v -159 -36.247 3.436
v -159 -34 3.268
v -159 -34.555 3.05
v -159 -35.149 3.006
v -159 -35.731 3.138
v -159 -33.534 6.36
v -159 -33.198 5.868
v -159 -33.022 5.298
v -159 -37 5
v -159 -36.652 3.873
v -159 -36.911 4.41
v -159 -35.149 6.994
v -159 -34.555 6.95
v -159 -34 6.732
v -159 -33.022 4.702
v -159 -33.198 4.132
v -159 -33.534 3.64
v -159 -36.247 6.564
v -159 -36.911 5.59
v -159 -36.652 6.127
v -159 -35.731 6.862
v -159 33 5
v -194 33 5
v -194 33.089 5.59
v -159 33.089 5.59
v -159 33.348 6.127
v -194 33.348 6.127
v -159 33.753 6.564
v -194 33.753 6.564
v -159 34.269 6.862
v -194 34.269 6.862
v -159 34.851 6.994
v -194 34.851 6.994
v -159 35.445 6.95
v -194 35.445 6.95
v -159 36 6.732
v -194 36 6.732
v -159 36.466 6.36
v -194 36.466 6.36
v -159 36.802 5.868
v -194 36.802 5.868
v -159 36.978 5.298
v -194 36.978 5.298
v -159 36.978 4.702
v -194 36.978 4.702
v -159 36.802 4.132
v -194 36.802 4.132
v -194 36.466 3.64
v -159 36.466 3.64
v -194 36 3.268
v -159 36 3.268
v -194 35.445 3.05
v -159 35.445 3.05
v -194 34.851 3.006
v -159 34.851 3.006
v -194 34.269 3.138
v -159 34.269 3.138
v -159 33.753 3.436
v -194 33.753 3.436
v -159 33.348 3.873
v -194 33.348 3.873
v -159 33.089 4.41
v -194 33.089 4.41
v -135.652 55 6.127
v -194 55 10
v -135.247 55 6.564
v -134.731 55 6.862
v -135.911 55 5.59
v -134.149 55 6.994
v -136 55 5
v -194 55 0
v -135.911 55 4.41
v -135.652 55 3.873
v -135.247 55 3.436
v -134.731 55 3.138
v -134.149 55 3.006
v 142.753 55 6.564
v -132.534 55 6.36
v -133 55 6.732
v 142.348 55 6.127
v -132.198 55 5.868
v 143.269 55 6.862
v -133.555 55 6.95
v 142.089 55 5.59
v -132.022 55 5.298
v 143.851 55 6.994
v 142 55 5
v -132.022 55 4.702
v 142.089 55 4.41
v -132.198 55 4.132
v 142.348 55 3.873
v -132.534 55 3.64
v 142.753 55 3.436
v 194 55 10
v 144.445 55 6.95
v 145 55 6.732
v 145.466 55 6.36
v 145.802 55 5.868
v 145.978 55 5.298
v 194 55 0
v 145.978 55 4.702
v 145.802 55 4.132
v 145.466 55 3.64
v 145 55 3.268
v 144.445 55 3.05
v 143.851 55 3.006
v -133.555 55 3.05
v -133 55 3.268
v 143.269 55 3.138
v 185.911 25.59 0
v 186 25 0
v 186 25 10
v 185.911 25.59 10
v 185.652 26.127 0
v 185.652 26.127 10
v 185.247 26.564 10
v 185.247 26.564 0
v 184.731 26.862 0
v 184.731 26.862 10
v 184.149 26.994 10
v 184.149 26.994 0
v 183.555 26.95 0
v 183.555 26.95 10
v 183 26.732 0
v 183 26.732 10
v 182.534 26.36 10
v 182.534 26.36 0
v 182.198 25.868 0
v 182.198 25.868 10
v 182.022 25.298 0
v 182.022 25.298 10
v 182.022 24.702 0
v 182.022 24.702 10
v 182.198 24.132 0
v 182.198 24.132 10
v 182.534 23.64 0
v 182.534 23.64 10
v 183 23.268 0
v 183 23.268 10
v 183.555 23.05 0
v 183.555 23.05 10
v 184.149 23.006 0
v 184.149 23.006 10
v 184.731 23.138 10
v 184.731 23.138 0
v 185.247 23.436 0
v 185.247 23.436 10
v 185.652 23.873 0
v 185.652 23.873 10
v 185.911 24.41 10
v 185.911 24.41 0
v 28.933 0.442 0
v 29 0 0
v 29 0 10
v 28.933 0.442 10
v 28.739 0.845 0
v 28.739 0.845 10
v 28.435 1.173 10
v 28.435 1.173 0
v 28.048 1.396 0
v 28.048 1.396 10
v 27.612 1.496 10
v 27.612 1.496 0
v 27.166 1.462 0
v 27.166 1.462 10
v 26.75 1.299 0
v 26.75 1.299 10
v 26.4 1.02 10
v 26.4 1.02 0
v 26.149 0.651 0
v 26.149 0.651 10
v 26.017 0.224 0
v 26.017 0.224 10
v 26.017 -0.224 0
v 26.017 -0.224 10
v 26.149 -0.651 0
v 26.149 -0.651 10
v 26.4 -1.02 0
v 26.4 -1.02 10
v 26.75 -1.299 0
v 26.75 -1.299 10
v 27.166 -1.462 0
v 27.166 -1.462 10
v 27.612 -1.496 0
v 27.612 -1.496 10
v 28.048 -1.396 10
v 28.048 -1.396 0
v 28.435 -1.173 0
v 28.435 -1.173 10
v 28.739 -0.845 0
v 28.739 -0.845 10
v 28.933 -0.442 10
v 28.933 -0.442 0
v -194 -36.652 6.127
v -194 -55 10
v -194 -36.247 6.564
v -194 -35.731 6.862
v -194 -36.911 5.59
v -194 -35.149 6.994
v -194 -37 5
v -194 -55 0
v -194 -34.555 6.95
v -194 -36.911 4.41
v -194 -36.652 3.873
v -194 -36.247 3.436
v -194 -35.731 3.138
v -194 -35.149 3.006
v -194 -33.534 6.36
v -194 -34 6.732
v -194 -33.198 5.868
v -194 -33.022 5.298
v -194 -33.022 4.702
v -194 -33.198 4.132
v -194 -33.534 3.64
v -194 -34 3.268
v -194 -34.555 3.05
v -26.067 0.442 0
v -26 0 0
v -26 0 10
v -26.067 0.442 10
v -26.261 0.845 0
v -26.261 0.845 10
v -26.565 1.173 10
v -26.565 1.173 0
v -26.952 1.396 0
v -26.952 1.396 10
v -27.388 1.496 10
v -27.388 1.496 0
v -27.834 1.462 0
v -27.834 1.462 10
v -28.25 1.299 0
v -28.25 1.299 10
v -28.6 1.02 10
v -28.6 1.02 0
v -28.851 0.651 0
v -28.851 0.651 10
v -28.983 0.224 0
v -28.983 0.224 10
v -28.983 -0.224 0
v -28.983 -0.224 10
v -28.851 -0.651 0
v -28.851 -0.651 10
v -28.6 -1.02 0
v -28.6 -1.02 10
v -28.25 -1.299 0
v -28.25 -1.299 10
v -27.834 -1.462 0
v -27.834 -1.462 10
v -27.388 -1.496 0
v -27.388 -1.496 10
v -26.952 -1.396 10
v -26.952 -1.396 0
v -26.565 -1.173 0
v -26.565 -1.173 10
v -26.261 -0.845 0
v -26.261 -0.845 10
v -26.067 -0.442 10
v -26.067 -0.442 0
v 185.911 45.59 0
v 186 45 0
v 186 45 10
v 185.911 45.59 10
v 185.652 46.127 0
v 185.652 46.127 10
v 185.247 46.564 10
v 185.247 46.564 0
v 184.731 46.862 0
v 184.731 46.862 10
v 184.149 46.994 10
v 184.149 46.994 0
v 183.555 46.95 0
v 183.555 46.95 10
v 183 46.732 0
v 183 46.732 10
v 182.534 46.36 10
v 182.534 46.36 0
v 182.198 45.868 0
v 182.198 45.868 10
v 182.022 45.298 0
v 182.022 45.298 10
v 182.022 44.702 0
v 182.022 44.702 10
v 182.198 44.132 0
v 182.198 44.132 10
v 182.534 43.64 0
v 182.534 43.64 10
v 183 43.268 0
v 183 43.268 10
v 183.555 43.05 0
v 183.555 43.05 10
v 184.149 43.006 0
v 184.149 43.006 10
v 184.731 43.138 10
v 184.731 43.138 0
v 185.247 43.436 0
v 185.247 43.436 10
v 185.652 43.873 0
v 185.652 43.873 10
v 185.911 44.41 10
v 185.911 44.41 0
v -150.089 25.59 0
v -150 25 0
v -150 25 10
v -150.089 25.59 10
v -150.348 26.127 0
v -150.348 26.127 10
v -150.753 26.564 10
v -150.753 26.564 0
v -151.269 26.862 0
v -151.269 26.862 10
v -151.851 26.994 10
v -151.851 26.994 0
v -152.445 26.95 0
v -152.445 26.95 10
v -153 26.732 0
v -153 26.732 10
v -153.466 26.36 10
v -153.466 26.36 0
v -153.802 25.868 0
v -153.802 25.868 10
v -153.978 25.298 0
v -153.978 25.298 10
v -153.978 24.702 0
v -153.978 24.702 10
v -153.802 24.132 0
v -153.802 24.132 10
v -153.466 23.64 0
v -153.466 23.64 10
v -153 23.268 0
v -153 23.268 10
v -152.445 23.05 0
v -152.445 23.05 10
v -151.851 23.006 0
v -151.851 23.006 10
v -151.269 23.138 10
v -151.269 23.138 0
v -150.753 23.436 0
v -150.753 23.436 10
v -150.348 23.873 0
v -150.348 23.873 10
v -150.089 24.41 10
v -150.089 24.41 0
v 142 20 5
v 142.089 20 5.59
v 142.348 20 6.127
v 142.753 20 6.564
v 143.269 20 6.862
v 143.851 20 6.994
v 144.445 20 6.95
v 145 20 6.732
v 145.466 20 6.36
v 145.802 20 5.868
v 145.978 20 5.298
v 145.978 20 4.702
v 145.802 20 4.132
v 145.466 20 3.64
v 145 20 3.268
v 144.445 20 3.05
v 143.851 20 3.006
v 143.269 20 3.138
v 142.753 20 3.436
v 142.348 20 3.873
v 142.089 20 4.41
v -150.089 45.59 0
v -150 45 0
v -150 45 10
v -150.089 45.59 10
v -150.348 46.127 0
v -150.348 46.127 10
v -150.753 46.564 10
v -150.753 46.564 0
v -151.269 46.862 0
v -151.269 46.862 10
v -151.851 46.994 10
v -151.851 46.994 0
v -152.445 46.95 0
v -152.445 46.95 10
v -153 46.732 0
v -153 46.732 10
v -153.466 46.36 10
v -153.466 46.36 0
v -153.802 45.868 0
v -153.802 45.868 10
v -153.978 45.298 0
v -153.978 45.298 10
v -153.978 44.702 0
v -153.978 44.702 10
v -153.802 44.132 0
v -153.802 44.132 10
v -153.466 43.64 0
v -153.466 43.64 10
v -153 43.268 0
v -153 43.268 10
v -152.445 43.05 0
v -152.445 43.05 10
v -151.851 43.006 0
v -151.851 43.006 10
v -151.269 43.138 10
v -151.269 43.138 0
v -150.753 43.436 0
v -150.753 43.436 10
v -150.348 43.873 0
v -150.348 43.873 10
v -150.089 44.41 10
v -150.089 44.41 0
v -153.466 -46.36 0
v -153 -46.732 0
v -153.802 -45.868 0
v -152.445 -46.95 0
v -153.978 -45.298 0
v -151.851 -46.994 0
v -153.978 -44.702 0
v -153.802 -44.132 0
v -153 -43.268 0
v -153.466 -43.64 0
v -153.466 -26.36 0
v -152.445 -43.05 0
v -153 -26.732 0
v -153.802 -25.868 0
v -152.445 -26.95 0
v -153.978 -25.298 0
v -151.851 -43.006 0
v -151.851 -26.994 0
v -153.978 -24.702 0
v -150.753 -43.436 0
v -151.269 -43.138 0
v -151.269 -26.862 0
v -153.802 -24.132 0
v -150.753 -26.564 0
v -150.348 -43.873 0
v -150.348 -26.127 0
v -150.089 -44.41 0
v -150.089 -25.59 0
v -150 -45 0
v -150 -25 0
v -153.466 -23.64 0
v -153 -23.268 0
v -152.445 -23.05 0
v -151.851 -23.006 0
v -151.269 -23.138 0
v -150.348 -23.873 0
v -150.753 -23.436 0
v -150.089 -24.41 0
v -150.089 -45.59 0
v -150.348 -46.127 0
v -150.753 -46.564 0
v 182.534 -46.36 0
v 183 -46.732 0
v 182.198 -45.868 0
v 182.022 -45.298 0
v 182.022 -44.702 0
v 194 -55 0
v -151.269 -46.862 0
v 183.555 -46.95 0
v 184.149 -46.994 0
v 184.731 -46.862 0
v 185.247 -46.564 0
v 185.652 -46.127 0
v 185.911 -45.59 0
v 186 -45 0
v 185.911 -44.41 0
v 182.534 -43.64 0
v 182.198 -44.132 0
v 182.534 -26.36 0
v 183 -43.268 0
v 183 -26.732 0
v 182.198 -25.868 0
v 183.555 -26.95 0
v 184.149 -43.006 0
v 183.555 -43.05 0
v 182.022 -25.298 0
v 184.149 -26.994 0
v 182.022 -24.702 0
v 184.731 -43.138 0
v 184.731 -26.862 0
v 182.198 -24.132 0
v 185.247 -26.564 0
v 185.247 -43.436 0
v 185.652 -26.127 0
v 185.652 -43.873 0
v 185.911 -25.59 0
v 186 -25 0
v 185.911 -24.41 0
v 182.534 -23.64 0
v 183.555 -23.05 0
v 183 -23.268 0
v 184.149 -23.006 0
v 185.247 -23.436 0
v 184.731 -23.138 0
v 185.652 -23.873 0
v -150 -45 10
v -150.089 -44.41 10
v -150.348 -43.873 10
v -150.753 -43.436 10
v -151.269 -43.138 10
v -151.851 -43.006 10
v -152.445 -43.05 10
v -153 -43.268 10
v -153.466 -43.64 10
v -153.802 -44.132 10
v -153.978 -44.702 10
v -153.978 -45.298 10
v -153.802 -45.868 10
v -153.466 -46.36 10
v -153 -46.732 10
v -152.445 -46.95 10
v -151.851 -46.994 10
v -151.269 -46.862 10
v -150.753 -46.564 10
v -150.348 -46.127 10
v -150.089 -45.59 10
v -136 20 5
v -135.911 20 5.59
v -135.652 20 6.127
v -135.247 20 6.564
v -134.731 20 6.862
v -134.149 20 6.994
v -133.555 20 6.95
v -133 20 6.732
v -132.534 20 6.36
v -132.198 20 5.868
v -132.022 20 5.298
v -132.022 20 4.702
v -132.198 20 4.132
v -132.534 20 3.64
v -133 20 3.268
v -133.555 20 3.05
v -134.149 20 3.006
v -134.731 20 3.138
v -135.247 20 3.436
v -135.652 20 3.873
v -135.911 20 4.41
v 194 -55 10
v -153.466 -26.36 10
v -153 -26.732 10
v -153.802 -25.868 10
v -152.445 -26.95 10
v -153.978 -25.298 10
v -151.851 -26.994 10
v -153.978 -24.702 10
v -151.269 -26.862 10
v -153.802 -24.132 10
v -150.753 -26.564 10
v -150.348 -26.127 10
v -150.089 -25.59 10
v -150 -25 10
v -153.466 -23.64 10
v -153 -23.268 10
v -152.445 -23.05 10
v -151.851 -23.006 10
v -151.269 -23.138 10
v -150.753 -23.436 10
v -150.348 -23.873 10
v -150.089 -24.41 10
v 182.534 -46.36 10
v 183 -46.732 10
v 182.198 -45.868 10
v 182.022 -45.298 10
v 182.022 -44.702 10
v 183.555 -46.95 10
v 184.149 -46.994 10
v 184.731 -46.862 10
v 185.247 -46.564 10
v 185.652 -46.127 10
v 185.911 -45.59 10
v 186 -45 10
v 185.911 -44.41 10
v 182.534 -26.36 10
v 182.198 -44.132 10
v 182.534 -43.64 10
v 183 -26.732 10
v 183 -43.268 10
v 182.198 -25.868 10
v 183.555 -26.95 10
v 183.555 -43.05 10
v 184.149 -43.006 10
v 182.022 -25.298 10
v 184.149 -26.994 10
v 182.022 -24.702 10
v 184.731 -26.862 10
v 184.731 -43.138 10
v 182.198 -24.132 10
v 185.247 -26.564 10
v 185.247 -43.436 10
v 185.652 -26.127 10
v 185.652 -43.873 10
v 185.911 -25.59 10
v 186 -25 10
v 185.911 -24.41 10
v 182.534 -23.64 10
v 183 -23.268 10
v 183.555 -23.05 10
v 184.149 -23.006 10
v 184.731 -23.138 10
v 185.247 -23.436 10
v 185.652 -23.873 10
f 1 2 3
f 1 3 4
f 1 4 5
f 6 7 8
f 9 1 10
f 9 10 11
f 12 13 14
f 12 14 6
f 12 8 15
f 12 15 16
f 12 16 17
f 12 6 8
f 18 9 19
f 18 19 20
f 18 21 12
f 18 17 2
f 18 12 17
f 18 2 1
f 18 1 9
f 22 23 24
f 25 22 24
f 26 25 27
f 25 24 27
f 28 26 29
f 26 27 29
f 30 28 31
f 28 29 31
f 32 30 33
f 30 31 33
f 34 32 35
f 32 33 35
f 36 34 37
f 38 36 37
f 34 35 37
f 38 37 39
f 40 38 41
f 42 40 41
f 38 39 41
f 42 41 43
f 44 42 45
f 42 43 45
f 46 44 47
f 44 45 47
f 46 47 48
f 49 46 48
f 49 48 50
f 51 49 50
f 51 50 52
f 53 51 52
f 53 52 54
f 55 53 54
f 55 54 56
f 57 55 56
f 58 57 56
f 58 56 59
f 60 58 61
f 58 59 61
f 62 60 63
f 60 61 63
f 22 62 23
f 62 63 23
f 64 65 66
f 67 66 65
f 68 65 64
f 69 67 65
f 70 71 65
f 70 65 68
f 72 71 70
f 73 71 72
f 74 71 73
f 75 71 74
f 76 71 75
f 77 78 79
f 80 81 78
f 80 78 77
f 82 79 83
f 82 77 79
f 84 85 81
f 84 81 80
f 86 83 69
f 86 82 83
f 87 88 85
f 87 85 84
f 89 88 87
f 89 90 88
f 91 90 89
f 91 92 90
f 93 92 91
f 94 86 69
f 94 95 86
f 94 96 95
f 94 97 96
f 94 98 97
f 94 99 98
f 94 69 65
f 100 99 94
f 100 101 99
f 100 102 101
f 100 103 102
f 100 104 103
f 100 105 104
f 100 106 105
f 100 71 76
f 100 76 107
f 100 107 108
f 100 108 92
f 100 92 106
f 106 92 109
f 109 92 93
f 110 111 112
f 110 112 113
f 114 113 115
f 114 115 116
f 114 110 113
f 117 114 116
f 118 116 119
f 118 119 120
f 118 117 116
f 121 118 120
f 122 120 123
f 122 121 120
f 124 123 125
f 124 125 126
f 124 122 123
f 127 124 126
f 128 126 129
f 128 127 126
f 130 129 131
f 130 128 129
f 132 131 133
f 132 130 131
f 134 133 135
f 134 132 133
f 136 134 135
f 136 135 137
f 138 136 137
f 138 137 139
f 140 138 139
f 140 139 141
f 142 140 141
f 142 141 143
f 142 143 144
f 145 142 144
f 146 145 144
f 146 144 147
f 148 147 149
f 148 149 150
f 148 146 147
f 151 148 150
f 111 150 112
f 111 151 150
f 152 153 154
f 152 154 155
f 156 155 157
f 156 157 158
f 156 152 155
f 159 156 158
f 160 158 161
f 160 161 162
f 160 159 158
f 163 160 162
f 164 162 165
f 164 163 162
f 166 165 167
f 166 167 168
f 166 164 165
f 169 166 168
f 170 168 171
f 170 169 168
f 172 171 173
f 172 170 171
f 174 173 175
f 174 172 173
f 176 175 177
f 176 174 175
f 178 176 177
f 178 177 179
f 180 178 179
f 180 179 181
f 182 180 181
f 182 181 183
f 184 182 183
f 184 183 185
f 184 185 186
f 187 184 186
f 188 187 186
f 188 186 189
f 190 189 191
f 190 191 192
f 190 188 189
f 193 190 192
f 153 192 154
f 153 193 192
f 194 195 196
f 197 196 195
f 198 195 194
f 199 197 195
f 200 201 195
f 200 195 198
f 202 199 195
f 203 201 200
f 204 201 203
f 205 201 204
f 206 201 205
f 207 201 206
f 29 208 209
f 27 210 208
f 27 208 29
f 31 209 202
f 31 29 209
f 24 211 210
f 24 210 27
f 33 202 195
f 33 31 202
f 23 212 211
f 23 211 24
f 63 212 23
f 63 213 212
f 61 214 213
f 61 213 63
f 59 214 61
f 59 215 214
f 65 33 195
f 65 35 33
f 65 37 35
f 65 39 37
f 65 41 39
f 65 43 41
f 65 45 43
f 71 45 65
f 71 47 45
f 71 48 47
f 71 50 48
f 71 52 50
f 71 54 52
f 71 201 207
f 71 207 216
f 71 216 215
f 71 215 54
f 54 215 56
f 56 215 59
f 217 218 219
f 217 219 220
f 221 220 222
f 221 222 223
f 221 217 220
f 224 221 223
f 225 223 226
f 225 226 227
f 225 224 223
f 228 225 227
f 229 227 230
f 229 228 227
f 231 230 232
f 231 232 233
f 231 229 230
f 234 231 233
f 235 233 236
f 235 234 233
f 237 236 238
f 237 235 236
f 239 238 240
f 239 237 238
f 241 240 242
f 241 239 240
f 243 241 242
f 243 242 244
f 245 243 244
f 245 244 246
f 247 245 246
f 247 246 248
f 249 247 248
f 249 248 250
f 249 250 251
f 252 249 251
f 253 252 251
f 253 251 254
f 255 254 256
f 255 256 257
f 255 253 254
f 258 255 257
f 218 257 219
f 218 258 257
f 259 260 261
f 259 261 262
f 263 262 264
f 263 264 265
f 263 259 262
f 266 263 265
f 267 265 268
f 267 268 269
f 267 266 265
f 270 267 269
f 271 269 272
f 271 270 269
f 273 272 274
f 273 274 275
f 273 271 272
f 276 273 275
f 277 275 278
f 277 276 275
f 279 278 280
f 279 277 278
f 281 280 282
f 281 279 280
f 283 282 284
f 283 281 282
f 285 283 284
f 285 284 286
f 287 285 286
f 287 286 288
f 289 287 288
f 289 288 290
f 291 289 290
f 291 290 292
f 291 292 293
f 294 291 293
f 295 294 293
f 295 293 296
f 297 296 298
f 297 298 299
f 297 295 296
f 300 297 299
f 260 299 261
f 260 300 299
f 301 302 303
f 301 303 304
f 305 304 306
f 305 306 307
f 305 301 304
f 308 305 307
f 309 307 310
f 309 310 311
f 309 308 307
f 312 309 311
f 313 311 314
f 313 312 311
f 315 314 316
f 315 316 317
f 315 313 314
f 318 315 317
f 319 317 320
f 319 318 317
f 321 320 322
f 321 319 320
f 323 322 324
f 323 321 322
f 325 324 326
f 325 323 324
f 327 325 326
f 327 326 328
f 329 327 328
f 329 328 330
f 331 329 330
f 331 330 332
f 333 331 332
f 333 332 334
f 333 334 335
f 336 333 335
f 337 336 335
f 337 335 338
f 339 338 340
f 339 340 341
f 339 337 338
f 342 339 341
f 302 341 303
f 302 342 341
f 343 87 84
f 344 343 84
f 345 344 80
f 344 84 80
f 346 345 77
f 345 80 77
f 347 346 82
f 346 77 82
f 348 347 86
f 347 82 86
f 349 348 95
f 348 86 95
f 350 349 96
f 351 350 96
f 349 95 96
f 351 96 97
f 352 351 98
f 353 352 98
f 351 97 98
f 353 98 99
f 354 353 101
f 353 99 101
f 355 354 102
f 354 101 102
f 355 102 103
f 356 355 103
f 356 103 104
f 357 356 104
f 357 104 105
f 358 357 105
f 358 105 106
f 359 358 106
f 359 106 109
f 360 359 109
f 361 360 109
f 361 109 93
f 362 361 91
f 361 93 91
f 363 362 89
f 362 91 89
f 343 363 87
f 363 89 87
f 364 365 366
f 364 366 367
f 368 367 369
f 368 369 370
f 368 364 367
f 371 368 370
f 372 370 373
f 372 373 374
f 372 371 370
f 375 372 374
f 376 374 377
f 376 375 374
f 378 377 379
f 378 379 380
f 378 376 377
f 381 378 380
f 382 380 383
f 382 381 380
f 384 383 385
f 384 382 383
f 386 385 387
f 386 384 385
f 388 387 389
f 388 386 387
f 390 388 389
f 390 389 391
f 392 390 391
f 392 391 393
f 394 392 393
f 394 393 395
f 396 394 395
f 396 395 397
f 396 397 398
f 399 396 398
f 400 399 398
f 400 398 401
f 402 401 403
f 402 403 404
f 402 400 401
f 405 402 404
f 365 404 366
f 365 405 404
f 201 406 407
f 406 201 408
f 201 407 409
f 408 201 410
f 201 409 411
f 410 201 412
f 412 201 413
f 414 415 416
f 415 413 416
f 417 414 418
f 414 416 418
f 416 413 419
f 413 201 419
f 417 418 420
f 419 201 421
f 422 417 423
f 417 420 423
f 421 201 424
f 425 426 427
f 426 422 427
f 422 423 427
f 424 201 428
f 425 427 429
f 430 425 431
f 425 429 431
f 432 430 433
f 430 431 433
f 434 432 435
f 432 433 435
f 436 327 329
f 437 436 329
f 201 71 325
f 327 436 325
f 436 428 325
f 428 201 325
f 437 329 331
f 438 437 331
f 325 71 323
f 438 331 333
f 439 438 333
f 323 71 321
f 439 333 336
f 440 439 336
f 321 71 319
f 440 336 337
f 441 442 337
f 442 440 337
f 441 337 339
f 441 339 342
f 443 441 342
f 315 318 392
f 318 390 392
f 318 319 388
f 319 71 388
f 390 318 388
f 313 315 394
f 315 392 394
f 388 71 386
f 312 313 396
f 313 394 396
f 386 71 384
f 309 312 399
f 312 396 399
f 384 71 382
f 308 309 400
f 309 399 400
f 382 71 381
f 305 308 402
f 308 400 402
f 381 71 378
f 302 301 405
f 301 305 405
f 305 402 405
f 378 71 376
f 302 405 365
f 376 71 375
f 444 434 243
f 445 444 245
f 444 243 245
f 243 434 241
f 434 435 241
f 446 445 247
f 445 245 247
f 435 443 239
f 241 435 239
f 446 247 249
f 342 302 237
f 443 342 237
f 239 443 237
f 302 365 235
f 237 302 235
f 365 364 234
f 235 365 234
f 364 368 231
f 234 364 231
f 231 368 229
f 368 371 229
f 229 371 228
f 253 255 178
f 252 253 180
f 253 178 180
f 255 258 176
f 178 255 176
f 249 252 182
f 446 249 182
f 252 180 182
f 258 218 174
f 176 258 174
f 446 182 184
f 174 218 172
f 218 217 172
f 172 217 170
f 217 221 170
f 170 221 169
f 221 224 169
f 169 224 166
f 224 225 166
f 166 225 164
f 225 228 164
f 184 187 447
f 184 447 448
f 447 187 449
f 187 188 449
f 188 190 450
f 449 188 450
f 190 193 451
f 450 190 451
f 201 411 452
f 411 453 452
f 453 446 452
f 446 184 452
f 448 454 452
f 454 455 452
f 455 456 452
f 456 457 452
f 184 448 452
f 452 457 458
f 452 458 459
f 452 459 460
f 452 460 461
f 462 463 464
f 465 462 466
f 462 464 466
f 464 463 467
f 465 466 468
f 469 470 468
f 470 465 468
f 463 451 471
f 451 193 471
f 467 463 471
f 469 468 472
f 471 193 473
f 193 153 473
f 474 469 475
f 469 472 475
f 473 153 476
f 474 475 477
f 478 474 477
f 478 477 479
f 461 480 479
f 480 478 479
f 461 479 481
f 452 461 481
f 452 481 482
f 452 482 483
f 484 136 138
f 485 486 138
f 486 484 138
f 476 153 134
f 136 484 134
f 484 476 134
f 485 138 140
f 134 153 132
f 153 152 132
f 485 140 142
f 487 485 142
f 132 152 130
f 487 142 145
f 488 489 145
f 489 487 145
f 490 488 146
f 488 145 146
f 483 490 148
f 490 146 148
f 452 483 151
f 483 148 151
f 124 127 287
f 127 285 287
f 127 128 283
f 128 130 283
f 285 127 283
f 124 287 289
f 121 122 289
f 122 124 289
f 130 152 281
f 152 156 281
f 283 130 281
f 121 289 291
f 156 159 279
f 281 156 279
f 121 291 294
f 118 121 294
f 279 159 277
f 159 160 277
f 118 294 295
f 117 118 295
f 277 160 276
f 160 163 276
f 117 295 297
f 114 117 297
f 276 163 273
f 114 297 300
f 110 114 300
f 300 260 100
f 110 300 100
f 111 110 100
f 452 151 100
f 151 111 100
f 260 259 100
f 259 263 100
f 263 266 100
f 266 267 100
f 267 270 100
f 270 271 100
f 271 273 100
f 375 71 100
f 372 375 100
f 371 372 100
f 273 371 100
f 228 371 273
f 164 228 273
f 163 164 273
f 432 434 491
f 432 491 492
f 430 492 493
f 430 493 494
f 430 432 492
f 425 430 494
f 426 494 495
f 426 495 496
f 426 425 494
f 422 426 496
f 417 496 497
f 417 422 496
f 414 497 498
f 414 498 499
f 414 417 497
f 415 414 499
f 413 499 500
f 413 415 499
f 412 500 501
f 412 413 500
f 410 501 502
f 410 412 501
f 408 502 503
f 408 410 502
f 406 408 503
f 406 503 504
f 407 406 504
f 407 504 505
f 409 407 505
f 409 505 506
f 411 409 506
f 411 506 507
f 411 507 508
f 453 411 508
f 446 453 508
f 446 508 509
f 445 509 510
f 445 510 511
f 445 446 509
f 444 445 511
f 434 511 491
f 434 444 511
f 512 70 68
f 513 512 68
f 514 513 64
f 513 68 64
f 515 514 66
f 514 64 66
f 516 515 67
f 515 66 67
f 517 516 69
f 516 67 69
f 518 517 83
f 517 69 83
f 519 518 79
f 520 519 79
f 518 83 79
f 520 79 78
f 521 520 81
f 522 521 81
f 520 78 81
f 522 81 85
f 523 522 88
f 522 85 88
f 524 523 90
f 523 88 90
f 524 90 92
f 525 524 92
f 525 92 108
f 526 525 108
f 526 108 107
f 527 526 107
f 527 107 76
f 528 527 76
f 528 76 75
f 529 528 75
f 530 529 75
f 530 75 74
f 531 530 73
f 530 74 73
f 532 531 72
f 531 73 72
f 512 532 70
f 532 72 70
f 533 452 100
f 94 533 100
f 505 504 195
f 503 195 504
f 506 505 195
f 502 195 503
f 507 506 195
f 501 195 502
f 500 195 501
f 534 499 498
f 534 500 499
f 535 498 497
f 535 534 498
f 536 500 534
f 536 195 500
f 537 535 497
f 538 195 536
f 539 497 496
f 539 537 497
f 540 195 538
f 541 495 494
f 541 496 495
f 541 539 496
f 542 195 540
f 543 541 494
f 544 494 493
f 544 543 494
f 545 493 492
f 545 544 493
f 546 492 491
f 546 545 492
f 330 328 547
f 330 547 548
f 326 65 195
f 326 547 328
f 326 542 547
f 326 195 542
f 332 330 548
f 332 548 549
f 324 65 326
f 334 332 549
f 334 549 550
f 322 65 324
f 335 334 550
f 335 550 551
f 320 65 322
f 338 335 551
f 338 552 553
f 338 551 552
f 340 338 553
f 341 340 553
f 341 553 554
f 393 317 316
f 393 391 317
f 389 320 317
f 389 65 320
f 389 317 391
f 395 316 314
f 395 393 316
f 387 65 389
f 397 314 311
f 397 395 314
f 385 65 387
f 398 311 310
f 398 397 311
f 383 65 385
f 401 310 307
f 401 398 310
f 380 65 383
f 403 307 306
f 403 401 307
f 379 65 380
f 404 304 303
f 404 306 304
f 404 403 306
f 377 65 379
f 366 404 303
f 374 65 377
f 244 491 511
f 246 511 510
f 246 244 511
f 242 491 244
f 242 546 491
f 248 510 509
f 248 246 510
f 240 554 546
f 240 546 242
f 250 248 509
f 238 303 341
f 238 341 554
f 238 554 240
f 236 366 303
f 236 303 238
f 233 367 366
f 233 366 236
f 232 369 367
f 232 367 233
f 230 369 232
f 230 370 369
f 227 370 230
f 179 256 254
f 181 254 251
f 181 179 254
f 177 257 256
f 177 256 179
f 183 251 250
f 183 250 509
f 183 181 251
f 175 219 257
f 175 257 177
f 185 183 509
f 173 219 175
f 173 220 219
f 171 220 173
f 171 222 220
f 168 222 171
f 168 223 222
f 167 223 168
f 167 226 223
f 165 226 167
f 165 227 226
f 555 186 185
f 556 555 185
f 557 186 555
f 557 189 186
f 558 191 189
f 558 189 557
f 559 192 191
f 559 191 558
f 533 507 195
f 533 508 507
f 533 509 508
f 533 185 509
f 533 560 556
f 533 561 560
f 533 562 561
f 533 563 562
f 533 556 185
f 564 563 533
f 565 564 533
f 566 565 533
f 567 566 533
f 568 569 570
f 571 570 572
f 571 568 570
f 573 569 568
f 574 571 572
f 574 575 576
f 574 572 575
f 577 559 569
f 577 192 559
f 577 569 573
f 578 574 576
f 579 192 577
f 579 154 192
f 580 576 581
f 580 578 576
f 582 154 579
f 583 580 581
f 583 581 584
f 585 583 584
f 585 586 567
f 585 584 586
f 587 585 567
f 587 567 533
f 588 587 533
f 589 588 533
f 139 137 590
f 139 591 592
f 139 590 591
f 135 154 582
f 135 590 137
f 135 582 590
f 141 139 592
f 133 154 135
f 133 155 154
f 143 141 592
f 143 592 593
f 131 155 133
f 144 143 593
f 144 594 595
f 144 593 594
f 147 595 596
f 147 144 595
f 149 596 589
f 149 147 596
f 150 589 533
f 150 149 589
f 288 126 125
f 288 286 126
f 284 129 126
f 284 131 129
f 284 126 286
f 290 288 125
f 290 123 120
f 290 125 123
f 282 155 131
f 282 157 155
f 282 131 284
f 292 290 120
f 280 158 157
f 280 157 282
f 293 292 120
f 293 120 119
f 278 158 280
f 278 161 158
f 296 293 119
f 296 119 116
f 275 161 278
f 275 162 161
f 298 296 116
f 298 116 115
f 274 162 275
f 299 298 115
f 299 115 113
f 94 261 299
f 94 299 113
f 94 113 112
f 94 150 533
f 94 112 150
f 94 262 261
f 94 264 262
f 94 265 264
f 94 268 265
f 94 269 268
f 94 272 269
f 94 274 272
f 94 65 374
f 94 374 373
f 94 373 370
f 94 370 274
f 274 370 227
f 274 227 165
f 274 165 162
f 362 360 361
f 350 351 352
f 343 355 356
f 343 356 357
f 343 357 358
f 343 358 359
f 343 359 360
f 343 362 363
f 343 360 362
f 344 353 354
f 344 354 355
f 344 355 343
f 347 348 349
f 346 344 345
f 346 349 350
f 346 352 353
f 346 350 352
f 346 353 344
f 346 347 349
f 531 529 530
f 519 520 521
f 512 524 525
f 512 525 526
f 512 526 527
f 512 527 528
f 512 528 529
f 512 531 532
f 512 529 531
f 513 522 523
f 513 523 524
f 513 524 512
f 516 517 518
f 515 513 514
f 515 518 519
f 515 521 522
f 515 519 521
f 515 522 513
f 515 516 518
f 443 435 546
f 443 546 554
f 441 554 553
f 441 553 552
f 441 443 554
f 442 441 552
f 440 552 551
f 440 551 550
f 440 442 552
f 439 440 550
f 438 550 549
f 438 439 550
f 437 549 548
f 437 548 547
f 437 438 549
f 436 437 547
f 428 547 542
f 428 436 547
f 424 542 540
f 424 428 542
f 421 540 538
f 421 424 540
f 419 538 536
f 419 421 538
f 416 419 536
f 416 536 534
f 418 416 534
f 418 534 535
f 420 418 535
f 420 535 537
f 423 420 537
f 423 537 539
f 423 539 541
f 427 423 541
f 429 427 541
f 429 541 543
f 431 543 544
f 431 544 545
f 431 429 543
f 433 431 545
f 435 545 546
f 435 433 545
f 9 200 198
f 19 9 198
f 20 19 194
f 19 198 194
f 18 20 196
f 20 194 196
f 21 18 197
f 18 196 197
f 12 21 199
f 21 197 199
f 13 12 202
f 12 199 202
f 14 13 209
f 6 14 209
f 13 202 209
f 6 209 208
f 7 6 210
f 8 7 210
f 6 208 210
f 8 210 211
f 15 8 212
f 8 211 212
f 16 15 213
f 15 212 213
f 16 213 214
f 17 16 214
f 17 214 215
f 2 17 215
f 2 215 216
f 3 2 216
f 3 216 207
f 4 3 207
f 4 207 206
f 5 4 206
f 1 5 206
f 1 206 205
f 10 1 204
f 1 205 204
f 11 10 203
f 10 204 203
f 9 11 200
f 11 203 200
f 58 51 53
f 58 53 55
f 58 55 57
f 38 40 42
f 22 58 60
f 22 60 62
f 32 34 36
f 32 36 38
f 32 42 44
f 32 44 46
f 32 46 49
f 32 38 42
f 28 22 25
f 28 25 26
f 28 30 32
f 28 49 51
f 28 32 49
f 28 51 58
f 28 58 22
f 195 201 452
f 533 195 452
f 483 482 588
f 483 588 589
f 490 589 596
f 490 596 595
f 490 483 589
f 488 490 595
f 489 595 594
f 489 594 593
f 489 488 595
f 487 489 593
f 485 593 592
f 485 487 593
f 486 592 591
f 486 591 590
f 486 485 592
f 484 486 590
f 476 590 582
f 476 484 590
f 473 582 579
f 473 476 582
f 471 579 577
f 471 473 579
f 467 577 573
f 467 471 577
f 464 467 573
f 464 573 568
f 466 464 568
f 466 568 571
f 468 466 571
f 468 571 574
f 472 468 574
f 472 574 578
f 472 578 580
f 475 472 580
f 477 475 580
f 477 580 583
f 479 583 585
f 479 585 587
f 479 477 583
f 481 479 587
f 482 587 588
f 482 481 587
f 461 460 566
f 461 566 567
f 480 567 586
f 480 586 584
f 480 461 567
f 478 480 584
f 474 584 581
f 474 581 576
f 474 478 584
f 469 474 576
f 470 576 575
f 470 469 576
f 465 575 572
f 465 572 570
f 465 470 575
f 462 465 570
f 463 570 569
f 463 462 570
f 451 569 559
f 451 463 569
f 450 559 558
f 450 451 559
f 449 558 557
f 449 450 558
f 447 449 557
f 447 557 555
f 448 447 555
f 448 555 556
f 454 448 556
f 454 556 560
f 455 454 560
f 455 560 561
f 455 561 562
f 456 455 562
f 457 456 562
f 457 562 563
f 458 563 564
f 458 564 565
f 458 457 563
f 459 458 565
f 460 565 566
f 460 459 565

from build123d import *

# Parameters (mm, degrees)
F0_W     = 388
F0_H     = 110
F0_R     = 2
F0_R_2   = 1.5
F1_DEPTH = 10
F2_R     = 2
F3_DEPTH = 35
F4_R     = 2
F5_DEPTH = 35


with BuildPart() as f1:
    # F0 (on Top) → F1 (new body)
    with BuildSketch(Plane.XY):
        Rectangle(F0_W, F0_H)
        with Locations((-152, -45)):
            Circle(F0_R, mode=Mode.SUBTRACT)
        with Locations((-152, -25)):
            Circle(F0_R, mode=Mode.SUBTRACT)
        with Locations((184, -45)):
            Circle(F0_R, mode=Mode.SUBTRACT)
        with Locations((184, -25)):
            Circle(F0_R, mode=Mode.SUBTRACT)
        with Locations((-152, 25)):
            Circle(F0_R, mode=Mode.SUBTRACT)
        with Locations((-27.5, 0)):
            Circle(F0_R_2, mode=Mode.SUBTRACT)
        with Locations((-152, 45)):
            Circle(F0_R, mode=Mode.SUBTRACT)
        with Locations((27.5, 0)):
            Circle(F0_R_2, mode=Mode.SUBTRACT)
        with Locations((184, 25)):
            Circle(F0_R, mode=Mode.SUBTRACT)
        with Locations((184, 45)):
            Circle(F0_R, mode=Mode.SUBTRACT)
    extrude(amount=F1_DEPTH)

    # F2 (on face) → F3 (cut)
    with BuildSketch(Plane(origin=(0, 55, 0), x_dir=(-1, 0, 0), z_dir=(0, 1, 0))):
        with Locations((-144, 5)):
            Circle(F2_R)
        with Locations((134, 5)):
            Circle(F2_R)
    extrude(amount=-F3_DEPTH, mode=Mode.SUBTRACT)

    # F4 (on face) → F5 (cut)
    with BuildSketch(Plane(origin=(-194, 0, 0), x_dir=(0, -1, 0), z_dir=(-1, 0, 0))):
        with Locations((-35, 5)):
            Circle(F4_R)
        with Locations((35, 5)):
            Circle(F4_R)
    extrude(amount=-F5_DEPTH, mode=Mode.SUBTRACT)


solid = f1.part
